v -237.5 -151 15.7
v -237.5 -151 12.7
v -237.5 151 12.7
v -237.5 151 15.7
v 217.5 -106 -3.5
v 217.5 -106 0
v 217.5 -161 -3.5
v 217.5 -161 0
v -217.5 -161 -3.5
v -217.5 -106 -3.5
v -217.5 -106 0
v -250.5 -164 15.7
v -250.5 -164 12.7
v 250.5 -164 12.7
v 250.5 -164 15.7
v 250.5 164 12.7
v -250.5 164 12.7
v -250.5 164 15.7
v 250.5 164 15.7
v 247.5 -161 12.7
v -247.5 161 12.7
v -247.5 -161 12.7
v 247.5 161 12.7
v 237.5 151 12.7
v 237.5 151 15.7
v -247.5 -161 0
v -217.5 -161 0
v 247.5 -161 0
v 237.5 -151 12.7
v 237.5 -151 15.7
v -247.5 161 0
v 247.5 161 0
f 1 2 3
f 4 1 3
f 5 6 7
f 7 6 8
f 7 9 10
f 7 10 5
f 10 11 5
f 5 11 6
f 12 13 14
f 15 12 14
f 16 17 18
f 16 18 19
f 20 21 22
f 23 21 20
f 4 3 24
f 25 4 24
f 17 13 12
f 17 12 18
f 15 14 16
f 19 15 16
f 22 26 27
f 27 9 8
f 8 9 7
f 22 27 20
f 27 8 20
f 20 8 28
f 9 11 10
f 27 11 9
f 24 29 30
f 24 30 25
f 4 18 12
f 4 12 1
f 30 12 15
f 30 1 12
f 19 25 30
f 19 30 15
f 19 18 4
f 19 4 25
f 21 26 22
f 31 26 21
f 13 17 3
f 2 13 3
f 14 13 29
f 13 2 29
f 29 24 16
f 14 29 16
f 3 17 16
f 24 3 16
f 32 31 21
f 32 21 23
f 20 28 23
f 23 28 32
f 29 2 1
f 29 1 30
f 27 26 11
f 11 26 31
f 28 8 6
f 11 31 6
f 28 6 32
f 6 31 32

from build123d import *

# Parameters (mm, degrees)
F0_W     = 495
F0_H     = 322
F1_DEPTH = 12.7
F2_W     = 435
F2_H     = 55
F3_DEPTH = 3.5
F4_W     = 501
F4_H     = 328
F4_W_2   = 475
F4_H_2   = 302
F5_DEPTH = 3


with BuildPart() as f1:
    # F0 (on Top) → F1 (new body)
    with BuildSketch(Plane.XY):
        Rectangle(F0_W, F0_H)
    extrude(amount=F1_DEPTH)

    # F2 (on face) → F3 (join)
    with BuildSketch(Plane(origin=(0, 0, 0), x_dir=(1, 0, 0), z_dir=(0, 0, -1))):
        with Locations((0, 133.5)):
            Rectangle(F2_W, F2_H)
    extrude(amount=F3_DEPTH)


with BuildPart() as f5:
    # F4 (on face) → F5 (new body)
    with BuildSketch(Plane.XY.offset(12.7)):
        Rectangle(F4_W, F4_H)
        Rectangle(F4_W_2, F4_H_2, mode=Mode.SUBTRACT)
    extrude(amount=F5_DEPTH)


solid = Compound([f1.part, f5.part])
